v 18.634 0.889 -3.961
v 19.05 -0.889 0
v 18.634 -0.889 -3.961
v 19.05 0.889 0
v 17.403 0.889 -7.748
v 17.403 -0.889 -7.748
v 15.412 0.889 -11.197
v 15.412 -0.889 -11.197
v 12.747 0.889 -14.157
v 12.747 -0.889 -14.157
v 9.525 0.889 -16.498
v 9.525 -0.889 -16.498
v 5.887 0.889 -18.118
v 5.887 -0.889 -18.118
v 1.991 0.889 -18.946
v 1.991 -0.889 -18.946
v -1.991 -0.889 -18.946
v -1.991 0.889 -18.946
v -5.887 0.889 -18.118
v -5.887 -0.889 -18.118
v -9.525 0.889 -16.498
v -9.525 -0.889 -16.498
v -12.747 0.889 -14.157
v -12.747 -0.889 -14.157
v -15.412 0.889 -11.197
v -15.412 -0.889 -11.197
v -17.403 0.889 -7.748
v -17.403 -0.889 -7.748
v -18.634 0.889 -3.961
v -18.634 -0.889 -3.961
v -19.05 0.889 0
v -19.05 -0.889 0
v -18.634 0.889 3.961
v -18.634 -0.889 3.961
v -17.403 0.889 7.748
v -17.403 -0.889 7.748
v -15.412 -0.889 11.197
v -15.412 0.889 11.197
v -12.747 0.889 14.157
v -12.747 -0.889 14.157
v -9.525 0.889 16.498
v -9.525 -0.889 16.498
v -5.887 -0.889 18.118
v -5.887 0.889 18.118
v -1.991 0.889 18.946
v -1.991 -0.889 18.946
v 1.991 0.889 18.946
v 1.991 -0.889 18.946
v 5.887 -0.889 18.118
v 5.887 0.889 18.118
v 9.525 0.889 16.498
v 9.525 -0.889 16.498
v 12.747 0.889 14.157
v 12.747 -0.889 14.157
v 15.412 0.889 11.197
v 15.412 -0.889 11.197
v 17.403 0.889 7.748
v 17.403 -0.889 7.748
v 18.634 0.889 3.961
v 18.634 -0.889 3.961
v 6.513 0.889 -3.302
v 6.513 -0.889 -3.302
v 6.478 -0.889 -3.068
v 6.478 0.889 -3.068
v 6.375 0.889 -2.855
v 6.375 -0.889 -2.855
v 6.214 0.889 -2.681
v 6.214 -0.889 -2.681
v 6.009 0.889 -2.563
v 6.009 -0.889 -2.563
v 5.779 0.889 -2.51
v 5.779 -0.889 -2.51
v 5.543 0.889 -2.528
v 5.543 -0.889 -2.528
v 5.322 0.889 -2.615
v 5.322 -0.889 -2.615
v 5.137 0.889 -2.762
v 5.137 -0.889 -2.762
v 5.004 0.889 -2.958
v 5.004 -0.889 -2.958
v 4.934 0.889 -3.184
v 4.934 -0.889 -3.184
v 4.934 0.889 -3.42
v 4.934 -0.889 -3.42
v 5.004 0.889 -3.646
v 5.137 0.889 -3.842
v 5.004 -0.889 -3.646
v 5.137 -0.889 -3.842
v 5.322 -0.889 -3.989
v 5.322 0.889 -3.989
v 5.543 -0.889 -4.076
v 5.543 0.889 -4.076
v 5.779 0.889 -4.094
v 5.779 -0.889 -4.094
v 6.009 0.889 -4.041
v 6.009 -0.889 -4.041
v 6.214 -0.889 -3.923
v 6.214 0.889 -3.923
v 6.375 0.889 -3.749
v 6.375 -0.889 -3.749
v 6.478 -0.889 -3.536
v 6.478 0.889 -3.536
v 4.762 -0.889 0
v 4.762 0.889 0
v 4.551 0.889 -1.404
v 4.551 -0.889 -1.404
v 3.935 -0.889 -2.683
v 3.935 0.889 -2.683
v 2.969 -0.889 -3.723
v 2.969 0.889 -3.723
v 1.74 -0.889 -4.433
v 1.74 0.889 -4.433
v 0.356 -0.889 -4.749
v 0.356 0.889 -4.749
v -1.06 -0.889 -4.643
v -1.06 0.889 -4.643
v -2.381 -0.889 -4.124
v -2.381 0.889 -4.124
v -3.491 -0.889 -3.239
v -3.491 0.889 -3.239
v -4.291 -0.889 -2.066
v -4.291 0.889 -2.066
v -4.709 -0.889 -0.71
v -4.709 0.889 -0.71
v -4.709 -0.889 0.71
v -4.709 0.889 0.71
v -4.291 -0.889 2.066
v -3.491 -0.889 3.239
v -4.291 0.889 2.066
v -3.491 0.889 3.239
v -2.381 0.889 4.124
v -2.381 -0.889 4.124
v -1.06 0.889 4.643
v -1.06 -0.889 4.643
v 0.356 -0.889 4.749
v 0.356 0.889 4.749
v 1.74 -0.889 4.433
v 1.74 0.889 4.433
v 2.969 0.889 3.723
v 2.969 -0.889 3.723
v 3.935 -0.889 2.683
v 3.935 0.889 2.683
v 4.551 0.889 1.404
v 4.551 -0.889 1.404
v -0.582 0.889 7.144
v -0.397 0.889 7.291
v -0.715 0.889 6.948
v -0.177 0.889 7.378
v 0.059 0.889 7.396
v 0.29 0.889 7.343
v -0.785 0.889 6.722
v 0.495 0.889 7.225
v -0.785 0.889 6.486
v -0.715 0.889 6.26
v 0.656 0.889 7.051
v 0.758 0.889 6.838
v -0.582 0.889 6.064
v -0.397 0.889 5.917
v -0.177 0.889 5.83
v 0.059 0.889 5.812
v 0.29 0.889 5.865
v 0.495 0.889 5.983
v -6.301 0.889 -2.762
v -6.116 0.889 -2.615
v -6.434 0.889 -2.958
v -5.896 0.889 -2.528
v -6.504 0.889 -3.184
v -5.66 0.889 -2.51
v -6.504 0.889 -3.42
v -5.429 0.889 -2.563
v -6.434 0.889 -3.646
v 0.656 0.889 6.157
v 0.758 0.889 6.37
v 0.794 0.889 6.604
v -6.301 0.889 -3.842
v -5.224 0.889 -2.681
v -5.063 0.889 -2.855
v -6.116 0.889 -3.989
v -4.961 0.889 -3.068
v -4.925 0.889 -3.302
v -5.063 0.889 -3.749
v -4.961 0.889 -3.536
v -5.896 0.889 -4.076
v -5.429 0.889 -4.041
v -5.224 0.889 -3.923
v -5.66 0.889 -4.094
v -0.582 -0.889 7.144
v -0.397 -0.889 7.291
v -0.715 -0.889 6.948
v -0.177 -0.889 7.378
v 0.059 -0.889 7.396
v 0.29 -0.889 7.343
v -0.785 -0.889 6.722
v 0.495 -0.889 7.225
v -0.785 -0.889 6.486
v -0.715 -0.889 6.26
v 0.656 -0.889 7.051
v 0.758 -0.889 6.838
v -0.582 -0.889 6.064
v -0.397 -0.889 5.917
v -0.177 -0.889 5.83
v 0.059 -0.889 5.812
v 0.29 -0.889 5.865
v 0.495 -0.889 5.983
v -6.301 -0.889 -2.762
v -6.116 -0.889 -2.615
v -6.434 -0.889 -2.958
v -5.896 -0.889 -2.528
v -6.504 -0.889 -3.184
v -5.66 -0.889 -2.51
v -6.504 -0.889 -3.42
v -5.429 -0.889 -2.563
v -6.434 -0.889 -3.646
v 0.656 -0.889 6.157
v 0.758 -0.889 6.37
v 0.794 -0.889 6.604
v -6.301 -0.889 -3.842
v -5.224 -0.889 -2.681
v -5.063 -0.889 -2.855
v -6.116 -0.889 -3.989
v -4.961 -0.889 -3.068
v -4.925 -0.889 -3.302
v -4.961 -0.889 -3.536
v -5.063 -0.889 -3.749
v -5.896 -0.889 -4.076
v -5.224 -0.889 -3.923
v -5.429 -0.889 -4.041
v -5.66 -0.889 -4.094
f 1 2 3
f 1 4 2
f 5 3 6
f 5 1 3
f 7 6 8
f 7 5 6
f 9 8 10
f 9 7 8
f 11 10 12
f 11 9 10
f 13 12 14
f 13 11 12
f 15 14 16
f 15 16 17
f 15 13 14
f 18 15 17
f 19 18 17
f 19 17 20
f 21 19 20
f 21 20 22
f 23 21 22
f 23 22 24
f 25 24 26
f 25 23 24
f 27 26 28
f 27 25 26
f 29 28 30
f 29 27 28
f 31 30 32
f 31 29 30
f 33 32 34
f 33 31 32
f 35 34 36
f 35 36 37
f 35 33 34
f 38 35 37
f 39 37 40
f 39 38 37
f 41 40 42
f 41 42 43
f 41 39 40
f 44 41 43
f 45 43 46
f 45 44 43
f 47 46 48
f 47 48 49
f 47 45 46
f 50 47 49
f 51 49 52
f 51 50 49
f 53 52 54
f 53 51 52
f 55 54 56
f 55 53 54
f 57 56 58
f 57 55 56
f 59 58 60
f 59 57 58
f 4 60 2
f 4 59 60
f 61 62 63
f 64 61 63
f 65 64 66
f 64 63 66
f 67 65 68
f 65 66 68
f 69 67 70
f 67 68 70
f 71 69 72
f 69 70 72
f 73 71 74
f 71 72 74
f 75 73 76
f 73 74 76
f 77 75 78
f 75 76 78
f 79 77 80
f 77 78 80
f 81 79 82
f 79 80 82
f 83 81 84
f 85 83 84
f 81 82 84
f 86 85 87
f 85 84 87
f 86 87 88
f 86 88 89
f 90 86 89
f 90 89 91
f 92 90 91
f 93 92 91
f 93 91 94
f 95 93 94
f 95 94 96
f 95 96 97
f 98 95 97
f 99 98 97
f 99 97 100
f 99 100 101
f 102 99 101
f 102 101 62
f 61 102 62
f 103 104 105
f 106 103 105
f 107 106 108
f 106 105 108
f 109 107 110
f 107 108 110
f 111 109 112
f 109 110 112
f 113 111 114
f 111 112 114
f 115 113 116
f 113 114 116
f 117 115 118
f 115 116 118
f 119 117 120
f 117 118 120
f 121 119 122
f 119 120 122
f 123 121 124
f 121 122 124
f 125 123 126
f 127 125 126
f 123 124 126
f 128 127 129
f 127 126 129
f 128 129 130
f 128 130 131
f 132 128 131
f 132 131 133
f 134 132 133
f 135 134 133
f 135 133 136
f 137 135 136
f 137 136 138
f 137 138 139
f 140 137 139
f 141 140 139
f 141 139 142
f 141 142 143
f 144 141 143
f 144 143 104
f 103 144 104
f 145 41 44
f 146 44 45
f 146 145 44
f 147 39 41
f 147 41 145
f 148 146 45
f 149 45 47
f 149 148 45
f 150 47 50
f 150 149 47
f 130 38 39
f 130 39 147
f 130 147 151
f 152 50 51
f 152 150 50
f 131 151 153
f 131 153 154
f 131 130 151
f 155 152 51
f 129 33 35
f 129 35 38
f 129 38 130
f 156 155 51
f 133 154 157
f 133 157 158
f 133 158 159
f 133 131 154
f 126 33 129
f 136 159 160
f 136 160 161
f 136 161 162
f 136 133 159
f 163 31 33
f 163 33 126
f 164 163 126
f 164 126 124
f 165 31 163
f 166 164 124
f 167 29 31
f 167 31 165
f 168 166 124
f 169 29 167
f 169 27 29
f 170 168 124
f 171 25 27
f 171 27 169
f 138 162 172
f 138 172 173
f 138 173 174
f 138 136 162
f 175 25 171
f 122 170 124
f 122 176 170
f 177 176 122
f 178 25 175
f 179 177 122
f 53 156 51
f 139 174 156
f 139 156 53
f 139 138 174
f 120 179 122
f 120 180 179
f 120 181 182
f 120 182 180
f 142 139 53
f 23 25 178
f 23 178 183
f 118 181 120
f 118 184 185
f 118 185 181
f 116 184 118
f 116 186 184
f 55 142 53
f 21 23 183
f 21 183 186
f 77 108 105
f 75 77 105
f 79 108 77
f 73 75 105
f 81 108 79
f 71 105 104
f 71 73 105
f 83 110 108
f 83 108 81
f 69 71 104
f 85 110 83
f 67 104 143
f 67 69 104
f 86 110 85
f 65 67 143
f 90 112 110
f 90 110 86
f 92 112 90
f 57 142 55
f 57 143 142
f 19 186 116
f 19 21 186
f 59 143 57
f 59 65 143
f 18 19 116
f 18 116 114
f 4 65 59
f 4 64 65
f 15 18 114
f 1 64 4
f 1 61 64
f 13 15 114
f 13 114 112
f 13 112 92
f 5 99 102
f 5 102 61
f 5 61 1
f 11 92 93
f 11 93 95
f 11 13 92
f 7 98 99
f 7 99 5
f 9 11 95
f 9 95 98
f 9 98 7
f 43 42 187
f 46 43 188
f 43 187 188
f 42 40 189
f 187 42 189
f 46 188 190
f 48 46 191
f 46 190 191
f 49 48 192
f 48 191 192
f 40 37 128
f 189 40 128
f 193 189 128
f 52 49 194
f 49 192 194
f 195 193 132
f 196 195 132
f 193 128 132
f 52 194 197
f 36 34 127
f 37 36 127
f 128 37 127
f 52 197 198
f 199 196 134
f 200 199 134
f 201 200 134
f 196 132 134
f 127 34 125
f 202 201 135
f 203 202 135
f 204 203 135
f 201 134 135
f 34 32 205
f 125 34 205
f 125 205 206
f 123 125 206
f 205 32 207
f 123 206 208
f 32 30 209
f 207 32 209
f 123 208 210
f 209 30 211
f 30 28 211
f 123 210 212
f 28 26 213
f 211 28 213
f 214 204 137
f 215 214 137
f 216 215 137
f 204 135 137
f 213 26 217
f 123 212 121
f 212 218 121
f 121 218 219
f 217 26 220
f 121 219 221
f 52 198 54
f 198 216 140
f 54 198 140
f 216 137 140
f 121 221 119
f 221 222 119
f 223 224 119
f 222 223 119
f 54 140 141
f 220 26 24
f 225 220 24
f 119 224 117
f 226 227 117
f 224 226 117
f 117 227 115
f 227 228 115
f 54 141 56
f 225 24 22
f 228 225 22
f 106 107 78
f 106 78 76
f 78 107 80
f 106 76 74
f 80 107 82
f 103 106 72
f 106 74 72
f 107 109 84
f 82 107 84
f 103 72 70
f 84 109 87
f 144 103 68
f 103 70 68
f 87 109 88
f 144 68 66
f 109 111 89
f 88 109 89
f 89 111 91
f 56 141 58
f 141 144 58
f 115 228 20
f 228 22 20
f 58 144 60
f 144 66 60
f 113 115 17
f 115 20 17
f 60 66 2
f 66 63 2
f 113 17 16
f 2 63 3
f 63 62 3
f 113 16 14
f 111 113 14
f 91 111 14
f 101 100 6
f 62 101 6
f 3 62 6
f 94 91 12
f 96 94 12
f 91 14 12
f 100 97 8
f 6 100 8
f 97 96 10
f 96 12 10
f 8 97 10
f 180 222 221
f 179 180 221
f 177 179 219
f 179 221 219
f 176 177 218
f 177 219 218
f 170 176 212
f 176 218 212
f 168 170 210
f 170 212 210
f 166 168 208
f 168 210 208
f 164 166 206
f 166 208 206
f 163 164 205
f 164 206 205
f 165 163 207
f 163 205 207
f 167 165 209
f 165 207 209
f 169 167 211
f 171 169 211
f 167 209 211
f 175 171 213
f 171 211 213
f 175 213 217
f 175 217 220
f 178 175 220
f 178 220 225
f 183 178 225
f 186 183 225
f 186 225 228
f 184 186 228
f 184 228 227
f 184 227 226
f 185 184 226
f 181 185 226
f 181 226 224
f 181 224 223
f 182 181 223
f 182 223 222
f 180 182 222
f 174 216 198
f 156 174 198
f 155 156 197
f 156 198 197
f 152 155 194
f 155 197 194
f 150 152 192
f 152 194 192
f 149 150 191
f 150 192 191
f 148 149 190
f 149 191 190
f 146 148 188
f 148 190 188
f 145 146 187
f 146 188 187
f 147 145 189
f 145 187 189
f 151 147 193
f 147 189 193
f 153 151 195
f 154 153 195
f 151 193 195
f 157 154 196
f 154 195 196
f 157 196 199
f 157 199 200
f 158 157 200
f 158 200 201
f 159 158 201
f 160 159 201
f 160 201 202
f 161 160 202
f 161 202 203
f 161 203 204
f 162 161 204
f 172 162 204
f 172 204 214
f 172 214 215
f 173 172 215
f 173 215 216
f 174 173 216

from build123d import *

# Parameters (mm, degrees)
BOSS_EXTRUDE1_DEPTH      = 0.889
BOSS_EXTRUDE1_DEPTH_BACK = 0.889
SKETCH2_R                = 19.05
SKETCH4_R                = 4.7625
CUT_EXTRUDE1_DEPTH       = 27.999375622
SKETCH5_R                = 0.79375
CUT_EXTRUDE2_DEPTH       = 27.999375622


with BuildPart() as part:
    # Sketch2 → Boss-Extrude1 (new, two sides: drawn at the far end of the back side and taken through both)
    with BuildSketch(Plane(origin=(0, 0, 0), x_dir=(1, 0, 0), z_dir=(0, 1, 0)).offset(-BOSS_EXTRUDE1_DEPTH_BACK)):
        Circle(SKETCH2_R)
    extrude(amount=BOSS_EXTRUDE1_DEPTH + BOSS_EXTRUDE1_DEPTH_BACK)

    # Sketch4 → Cut-Extrude1 (cut, through all)
    with BuildSketch(Plane(origin=(0, 0.889, 0), x_dir=(1, 0, 0), z_dir=(0, 1, 0))):
        Circle(SKETCH4_R)
    extrude(amount=-CUT_EXTRUDE1_DEPTH, mode=Mode.SUBTRACT)

    # Sketch5 → Cut-Extrude2 (cut, through all)
    with BuildSketch(Plane.XZ.offset(0.889)):
        with Locations((0, 6.604)):
            Circle(SKETCH5_R)
        with Locations((5.719231767, -3.302)):
            Circle(SKETCH5_R)
        with Locations((-5.719231767, -3.302)):
            Circle(SKETCH5_R)
    extrude(amount=-CUT_EXTRUDE2_DEPTH, mode=Mode.SUBTRACT)


solid = part.part
